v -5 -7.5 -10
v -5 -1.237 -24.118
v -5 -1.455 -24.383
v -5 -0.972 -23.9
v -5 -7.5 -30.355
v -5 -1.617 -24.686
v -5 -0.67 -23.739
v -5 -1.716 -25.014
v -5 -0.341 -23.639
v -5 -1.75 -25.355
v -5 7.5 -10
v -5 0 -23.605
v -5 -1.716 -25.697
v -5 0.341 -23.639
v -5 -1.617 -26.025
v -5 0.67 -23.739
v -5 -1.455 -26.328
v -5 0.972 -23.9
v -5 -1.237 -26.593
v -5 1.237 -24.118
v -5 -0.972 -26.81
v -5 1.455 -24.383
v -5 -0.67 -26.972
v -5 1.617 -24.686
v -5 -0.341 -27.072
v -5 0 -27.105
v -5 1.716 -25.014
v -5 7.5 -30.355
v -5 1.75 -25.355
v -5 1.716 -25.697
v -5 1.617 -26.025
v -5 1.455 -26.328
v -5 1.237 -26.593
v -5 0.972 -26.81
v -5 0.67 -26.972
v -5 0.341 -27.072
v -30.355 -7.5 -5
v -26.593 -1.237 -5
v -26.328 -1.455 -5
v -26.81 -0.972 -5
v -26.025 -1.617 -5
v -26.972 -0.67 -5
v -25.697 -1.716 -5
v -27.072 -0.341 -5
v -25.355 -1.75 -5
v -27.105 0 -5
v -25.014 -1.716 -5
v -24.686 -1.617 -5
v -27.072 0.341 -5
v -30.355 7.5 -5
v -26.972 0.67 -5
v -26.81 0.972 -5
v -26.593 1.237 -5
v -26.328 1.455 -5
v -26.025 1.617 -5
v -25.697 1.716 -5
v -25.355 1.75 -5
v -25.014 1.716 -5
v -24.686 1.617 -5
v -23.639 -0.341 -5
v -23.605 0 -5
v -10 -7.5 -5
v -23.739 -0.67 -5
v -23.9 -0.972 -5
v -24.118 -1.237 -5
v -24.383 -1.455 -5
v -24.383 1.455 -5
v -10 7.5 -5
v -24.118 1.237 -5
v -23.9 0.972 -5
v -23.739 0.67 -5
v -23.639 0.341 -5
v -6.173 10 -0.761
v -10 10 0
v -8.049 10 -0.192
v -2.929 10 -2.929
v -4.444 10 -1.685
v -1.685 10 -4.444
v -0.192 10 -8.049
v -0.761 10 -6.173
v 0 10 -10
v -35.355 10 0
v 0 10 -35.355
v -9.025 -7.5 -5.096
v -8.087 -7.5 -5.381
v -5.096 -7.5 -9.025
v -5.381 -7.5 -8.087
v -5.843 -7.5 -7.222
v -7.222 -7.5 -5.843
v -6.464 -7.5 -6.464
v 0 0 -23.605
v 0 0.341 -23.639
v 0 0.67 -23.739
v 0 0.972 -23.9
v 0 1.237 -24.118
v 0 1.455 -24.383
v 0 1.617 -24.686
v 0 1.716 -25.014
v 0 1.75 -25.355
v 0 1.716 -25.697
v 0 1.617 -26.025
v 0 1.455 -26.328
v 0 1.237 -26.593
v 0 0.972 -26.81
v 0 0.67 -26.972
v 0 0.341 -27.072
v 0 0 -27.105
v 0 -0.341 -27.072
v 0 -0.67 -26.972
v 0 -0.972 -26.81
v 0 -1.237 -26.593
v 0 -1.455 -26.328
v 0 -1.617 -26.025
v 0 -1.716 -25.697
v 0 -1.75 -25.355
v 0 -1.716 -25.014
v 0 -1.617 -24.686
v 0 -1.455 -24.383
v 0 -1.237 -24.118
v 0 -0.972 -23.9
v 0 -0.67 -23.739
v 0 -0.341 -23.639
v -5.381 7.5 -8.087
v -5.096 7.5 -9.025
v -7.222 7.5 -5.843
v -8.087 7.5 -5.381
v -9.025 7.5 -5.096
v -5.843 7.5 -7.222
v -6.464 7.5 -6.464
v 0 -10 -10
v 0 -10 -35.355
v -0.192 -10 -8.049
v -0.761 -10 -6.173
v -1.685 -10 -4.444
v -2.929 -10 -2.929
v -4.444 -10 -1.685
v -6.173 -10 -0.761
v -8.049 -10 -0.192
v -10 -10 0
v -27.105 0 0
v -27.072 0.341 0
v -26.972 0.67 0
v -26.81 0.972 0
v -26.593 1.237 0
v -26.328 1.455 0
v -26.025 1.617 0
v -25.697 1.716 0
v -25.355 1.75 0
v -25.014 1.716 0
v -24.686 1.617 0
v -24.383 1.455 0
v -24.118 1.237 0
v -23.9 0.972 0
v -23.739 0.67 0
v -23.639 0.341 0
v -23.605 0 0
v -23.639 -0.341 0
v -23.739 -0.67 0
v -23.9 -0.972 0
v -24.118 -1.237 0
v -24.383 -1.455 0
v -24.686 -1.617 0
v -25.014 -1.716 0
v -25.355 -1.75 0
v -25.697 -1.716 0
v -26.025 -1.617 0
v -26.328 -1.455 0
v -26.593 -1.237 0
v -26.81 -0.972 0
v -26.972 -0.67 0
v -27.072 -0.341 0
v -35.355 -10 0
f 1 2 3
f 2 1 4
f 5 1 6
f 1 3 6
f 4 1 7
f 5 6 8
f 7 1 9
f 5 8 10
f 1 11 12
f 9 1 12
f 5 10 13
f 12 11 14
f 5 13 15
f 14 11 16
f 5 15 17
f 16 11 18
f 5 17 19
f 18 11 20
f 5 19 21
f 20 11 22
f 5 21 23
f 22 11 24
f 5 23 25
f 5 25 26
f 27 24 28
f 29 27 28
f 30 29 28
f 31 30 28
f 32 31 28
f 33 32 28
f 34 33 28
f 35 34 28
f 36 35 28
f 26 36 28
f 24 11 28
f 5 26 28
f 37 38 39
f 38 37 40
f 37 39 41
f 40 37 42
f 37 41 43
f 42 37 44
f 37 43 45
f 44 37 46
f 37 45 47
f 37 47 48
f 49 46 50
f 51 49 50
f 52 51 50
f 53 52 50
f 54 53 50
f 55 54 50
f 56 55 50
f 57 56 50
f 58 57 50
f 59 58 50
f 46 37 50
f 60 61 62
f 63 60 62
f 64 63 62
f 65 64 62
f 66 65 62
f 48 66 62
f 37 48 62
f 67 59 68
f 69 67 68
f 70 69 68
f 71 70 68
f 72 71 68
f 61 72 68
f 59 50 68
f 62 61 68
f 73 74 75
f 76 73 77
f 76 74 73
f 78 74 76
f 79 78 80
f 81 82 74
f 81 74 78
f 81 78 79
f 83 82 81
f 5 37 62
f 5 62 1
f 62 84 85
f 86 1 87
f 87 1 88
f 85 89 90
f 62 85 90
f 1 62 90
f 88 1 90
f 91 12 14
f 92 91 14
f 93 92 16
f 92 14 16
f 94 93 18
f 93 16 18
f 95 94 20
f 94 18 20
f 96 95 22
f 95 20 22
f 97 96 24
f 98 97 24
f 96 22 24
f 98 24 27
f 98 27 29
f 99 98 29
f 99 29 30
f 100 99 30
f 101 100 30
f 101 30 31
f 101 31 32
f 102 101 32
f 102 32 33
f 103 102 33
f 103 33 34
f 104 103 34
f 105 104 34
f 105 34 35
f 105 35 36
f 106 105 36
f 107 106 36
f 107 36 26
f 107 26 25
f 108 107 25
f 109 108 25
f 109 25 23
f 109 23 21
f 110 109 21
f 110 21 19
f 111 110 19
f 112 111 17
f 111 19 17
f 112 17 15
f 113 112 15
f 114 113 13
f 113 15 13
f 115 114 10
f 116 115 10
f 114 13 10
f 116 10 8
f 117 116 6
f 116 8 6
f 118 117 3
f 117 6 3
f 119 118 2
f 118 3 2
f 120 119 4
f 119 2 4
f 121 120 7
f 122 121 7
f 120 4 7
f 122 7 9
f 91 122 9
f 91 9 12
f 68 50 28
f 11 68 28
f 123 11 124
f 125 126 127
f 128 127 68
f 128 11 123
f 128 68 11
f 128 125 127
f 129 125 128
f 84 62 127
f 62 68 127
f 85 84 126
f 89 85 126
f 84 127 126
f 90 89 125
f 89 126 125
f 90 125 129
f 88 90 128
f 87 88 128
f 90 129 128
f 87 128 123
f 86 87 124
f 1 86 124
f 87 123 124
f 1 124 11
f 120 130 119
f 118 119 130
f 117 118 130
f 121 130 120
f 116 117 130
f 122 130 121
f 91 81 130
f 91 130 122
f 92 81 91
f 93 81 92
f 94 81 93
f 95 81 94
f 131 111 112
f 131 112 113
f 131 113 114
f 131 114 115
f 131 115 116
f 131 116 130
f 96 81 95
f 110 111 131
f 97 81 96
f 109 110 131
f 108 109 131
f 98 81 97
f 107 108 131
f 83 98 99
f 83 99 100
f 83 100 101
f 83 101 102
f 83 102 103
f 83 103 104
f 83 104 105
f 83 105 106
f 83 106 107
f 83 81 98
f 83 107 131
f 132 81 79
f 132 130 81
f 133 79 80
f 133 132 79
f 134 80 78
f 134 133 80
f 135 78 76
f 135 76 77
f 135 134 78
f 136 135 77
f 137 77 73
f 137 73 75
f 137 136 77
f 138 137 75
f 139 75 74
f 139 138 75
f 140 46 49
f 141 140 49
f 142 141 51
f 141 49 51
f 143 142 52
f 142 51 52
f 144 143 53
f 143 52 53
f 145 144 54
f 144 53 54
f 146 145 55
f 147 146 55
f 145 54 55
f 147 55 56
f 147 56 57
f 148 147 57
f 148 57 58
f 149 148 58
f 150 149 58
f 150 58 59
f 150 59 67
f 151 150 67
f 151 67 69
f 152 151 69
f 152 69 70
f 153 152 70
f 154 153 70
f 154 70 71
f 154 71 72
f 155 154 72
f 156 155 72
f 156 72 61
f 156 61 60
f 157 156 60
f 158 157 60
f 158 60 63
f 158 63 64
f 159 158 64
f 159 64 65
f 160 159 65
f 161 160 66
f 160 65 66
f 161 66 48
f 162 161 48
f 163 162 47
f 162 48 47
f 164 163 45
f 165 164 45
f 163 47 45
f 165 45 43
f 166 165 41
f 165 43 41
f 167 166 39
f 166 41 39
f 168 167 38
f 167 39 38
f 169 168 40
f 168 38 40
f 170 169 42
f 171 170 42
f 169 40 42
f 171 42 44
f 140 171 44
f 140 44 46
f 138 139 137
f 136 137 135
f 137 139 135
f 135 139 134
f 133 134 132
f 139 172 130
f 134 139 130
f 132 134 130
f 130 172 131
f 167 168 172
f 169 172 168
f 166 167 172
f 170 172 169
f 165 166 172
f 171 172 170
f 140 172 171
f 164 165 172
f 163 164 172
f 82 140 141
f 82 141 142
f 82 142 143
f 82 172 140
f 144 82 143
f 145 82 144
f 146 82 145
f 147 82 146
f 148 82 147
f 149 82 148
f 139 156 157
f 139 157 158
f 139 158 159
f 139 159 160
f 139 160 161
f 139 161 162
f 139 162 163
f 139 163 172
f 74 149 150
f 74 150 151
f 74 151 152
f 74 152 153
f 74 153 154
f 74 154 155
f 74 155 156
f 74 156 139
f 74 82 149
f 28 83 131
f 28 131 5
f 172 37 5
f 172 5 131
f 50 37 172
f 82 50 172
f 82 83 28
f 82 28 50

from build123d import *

# Parameters (mm, degrees)
BOSS_EXTRUDE1_DEPTH = 10
FILLET1_R           = 10
CUT_EXTRUDE1_START  = -5
SKETCH5_W           = 25.355339059
SKETCH5_H           = 15
CUT_EXTRUDE1_DEPTH  = 31.355339059
CUT_EXTRUDE3_START  = -5
SKETCH6_W           = 25.355339059
SKETCH6_H           = 15
CUT_EXTRUDE3_DEPTH  = 31.355339059
SKETCH8_W           = 5
SKETCH8_H           = 15
SKETCH9_R           = 1.75
CUT_EXTRUDE4_DEPTH  = 6
SKETCH10_R          = 1.75
CUT_EXTRUDE5_DEPTH  = 6


with BuildPart() as part:
    # Sketch1 → Boss-Extrude1 (new body, symmetric)
    with BuildSketch(Plane(origin=(0, 0, 0), x_dir=(1, 0, 0), z_dir=(0, 1, 0))):
        Polygon((0, 0), (0, 35.355339059), (-35.355339059, 0), align=None)
    extrude(amount=BOSS_EXTRUDE1_DEPTH, both=True)

    # Fillet1
    fillet1_edges = [part.edges().sort_by_distance(p)[0] for p in [
        (0, 0, 0),
    ]]
    fillet(fillet1_edges, radius=FILLET1_R)

    # Sketch5 → Cut-Extrude1 (cut, through all)
    with BuildSketch(Plane.XY.offset(CUT_EXTRUDE1_START)):
        with Locations((-22.67766953, 0)):
            Rectangle(SKETCH5_W, SKETCH5_H)
    extrude(amount=-CUT_EXTRUDE1_DEPTH, mode=Mode.SUBTRACT)

    # Sketch6 → Cut-Extrude3 (cut, through all)
    with BuildSketch(Plane(origin=(0, 0, 0), x_dir=(0, 0, -1), z_dir=(1, 0, 0)).offset(CUT_EXTRUDE3_START)):
        with Locations((22.67766953, 0)):
            Rectangle(SKETCH6_W, SKETCH6_H)
    extrude(amount=-CUT_EXTRUDE3_DEPTH, mode=Mode.SUBTRACT)

    # Sketch8 → Cut-Revolve2 (revolve, cut)
    with BuildSketch(Plane(origin=(0, 0, -10), x_dir=(-1, 0, 0), z_dir=(0, 0, -1))):
        with Locations((7.5, 0)):
            Rectangle(SKETCH8_W, SKETCH8_H)
    revolve(axis=Axis((-10, -7.5, -10), (0, 1, 0)), mode=Mode.SUBTRACT)

    # Sketch9 → Cut-Extrude4 (cut, through all)
    with BuildSketch(Plane.ZY.offset(5)):
        with Locations((-25.355339059, 0)):
            Circle(SKETCH9_R)
    extrude(amount=-CUT_EXTRUDE4_DEPTH, mode=Mode.SUBTRACT)

    # Sketch10 → Cut-Extrude5 (cut, through all)
    with BuildSketch(Plane(origin=(0, 0, -5), x_dir=(-1, 0, 0), z_dir=(0, 0, -1))):
        with Locations((25.355339059, 0)):
            Circle(SKETCH10_R)
    extrude(amount=-CUT_EXTRUDE5_DEPTH, mode=Mode.SUBTRACT)


solid = part.part
